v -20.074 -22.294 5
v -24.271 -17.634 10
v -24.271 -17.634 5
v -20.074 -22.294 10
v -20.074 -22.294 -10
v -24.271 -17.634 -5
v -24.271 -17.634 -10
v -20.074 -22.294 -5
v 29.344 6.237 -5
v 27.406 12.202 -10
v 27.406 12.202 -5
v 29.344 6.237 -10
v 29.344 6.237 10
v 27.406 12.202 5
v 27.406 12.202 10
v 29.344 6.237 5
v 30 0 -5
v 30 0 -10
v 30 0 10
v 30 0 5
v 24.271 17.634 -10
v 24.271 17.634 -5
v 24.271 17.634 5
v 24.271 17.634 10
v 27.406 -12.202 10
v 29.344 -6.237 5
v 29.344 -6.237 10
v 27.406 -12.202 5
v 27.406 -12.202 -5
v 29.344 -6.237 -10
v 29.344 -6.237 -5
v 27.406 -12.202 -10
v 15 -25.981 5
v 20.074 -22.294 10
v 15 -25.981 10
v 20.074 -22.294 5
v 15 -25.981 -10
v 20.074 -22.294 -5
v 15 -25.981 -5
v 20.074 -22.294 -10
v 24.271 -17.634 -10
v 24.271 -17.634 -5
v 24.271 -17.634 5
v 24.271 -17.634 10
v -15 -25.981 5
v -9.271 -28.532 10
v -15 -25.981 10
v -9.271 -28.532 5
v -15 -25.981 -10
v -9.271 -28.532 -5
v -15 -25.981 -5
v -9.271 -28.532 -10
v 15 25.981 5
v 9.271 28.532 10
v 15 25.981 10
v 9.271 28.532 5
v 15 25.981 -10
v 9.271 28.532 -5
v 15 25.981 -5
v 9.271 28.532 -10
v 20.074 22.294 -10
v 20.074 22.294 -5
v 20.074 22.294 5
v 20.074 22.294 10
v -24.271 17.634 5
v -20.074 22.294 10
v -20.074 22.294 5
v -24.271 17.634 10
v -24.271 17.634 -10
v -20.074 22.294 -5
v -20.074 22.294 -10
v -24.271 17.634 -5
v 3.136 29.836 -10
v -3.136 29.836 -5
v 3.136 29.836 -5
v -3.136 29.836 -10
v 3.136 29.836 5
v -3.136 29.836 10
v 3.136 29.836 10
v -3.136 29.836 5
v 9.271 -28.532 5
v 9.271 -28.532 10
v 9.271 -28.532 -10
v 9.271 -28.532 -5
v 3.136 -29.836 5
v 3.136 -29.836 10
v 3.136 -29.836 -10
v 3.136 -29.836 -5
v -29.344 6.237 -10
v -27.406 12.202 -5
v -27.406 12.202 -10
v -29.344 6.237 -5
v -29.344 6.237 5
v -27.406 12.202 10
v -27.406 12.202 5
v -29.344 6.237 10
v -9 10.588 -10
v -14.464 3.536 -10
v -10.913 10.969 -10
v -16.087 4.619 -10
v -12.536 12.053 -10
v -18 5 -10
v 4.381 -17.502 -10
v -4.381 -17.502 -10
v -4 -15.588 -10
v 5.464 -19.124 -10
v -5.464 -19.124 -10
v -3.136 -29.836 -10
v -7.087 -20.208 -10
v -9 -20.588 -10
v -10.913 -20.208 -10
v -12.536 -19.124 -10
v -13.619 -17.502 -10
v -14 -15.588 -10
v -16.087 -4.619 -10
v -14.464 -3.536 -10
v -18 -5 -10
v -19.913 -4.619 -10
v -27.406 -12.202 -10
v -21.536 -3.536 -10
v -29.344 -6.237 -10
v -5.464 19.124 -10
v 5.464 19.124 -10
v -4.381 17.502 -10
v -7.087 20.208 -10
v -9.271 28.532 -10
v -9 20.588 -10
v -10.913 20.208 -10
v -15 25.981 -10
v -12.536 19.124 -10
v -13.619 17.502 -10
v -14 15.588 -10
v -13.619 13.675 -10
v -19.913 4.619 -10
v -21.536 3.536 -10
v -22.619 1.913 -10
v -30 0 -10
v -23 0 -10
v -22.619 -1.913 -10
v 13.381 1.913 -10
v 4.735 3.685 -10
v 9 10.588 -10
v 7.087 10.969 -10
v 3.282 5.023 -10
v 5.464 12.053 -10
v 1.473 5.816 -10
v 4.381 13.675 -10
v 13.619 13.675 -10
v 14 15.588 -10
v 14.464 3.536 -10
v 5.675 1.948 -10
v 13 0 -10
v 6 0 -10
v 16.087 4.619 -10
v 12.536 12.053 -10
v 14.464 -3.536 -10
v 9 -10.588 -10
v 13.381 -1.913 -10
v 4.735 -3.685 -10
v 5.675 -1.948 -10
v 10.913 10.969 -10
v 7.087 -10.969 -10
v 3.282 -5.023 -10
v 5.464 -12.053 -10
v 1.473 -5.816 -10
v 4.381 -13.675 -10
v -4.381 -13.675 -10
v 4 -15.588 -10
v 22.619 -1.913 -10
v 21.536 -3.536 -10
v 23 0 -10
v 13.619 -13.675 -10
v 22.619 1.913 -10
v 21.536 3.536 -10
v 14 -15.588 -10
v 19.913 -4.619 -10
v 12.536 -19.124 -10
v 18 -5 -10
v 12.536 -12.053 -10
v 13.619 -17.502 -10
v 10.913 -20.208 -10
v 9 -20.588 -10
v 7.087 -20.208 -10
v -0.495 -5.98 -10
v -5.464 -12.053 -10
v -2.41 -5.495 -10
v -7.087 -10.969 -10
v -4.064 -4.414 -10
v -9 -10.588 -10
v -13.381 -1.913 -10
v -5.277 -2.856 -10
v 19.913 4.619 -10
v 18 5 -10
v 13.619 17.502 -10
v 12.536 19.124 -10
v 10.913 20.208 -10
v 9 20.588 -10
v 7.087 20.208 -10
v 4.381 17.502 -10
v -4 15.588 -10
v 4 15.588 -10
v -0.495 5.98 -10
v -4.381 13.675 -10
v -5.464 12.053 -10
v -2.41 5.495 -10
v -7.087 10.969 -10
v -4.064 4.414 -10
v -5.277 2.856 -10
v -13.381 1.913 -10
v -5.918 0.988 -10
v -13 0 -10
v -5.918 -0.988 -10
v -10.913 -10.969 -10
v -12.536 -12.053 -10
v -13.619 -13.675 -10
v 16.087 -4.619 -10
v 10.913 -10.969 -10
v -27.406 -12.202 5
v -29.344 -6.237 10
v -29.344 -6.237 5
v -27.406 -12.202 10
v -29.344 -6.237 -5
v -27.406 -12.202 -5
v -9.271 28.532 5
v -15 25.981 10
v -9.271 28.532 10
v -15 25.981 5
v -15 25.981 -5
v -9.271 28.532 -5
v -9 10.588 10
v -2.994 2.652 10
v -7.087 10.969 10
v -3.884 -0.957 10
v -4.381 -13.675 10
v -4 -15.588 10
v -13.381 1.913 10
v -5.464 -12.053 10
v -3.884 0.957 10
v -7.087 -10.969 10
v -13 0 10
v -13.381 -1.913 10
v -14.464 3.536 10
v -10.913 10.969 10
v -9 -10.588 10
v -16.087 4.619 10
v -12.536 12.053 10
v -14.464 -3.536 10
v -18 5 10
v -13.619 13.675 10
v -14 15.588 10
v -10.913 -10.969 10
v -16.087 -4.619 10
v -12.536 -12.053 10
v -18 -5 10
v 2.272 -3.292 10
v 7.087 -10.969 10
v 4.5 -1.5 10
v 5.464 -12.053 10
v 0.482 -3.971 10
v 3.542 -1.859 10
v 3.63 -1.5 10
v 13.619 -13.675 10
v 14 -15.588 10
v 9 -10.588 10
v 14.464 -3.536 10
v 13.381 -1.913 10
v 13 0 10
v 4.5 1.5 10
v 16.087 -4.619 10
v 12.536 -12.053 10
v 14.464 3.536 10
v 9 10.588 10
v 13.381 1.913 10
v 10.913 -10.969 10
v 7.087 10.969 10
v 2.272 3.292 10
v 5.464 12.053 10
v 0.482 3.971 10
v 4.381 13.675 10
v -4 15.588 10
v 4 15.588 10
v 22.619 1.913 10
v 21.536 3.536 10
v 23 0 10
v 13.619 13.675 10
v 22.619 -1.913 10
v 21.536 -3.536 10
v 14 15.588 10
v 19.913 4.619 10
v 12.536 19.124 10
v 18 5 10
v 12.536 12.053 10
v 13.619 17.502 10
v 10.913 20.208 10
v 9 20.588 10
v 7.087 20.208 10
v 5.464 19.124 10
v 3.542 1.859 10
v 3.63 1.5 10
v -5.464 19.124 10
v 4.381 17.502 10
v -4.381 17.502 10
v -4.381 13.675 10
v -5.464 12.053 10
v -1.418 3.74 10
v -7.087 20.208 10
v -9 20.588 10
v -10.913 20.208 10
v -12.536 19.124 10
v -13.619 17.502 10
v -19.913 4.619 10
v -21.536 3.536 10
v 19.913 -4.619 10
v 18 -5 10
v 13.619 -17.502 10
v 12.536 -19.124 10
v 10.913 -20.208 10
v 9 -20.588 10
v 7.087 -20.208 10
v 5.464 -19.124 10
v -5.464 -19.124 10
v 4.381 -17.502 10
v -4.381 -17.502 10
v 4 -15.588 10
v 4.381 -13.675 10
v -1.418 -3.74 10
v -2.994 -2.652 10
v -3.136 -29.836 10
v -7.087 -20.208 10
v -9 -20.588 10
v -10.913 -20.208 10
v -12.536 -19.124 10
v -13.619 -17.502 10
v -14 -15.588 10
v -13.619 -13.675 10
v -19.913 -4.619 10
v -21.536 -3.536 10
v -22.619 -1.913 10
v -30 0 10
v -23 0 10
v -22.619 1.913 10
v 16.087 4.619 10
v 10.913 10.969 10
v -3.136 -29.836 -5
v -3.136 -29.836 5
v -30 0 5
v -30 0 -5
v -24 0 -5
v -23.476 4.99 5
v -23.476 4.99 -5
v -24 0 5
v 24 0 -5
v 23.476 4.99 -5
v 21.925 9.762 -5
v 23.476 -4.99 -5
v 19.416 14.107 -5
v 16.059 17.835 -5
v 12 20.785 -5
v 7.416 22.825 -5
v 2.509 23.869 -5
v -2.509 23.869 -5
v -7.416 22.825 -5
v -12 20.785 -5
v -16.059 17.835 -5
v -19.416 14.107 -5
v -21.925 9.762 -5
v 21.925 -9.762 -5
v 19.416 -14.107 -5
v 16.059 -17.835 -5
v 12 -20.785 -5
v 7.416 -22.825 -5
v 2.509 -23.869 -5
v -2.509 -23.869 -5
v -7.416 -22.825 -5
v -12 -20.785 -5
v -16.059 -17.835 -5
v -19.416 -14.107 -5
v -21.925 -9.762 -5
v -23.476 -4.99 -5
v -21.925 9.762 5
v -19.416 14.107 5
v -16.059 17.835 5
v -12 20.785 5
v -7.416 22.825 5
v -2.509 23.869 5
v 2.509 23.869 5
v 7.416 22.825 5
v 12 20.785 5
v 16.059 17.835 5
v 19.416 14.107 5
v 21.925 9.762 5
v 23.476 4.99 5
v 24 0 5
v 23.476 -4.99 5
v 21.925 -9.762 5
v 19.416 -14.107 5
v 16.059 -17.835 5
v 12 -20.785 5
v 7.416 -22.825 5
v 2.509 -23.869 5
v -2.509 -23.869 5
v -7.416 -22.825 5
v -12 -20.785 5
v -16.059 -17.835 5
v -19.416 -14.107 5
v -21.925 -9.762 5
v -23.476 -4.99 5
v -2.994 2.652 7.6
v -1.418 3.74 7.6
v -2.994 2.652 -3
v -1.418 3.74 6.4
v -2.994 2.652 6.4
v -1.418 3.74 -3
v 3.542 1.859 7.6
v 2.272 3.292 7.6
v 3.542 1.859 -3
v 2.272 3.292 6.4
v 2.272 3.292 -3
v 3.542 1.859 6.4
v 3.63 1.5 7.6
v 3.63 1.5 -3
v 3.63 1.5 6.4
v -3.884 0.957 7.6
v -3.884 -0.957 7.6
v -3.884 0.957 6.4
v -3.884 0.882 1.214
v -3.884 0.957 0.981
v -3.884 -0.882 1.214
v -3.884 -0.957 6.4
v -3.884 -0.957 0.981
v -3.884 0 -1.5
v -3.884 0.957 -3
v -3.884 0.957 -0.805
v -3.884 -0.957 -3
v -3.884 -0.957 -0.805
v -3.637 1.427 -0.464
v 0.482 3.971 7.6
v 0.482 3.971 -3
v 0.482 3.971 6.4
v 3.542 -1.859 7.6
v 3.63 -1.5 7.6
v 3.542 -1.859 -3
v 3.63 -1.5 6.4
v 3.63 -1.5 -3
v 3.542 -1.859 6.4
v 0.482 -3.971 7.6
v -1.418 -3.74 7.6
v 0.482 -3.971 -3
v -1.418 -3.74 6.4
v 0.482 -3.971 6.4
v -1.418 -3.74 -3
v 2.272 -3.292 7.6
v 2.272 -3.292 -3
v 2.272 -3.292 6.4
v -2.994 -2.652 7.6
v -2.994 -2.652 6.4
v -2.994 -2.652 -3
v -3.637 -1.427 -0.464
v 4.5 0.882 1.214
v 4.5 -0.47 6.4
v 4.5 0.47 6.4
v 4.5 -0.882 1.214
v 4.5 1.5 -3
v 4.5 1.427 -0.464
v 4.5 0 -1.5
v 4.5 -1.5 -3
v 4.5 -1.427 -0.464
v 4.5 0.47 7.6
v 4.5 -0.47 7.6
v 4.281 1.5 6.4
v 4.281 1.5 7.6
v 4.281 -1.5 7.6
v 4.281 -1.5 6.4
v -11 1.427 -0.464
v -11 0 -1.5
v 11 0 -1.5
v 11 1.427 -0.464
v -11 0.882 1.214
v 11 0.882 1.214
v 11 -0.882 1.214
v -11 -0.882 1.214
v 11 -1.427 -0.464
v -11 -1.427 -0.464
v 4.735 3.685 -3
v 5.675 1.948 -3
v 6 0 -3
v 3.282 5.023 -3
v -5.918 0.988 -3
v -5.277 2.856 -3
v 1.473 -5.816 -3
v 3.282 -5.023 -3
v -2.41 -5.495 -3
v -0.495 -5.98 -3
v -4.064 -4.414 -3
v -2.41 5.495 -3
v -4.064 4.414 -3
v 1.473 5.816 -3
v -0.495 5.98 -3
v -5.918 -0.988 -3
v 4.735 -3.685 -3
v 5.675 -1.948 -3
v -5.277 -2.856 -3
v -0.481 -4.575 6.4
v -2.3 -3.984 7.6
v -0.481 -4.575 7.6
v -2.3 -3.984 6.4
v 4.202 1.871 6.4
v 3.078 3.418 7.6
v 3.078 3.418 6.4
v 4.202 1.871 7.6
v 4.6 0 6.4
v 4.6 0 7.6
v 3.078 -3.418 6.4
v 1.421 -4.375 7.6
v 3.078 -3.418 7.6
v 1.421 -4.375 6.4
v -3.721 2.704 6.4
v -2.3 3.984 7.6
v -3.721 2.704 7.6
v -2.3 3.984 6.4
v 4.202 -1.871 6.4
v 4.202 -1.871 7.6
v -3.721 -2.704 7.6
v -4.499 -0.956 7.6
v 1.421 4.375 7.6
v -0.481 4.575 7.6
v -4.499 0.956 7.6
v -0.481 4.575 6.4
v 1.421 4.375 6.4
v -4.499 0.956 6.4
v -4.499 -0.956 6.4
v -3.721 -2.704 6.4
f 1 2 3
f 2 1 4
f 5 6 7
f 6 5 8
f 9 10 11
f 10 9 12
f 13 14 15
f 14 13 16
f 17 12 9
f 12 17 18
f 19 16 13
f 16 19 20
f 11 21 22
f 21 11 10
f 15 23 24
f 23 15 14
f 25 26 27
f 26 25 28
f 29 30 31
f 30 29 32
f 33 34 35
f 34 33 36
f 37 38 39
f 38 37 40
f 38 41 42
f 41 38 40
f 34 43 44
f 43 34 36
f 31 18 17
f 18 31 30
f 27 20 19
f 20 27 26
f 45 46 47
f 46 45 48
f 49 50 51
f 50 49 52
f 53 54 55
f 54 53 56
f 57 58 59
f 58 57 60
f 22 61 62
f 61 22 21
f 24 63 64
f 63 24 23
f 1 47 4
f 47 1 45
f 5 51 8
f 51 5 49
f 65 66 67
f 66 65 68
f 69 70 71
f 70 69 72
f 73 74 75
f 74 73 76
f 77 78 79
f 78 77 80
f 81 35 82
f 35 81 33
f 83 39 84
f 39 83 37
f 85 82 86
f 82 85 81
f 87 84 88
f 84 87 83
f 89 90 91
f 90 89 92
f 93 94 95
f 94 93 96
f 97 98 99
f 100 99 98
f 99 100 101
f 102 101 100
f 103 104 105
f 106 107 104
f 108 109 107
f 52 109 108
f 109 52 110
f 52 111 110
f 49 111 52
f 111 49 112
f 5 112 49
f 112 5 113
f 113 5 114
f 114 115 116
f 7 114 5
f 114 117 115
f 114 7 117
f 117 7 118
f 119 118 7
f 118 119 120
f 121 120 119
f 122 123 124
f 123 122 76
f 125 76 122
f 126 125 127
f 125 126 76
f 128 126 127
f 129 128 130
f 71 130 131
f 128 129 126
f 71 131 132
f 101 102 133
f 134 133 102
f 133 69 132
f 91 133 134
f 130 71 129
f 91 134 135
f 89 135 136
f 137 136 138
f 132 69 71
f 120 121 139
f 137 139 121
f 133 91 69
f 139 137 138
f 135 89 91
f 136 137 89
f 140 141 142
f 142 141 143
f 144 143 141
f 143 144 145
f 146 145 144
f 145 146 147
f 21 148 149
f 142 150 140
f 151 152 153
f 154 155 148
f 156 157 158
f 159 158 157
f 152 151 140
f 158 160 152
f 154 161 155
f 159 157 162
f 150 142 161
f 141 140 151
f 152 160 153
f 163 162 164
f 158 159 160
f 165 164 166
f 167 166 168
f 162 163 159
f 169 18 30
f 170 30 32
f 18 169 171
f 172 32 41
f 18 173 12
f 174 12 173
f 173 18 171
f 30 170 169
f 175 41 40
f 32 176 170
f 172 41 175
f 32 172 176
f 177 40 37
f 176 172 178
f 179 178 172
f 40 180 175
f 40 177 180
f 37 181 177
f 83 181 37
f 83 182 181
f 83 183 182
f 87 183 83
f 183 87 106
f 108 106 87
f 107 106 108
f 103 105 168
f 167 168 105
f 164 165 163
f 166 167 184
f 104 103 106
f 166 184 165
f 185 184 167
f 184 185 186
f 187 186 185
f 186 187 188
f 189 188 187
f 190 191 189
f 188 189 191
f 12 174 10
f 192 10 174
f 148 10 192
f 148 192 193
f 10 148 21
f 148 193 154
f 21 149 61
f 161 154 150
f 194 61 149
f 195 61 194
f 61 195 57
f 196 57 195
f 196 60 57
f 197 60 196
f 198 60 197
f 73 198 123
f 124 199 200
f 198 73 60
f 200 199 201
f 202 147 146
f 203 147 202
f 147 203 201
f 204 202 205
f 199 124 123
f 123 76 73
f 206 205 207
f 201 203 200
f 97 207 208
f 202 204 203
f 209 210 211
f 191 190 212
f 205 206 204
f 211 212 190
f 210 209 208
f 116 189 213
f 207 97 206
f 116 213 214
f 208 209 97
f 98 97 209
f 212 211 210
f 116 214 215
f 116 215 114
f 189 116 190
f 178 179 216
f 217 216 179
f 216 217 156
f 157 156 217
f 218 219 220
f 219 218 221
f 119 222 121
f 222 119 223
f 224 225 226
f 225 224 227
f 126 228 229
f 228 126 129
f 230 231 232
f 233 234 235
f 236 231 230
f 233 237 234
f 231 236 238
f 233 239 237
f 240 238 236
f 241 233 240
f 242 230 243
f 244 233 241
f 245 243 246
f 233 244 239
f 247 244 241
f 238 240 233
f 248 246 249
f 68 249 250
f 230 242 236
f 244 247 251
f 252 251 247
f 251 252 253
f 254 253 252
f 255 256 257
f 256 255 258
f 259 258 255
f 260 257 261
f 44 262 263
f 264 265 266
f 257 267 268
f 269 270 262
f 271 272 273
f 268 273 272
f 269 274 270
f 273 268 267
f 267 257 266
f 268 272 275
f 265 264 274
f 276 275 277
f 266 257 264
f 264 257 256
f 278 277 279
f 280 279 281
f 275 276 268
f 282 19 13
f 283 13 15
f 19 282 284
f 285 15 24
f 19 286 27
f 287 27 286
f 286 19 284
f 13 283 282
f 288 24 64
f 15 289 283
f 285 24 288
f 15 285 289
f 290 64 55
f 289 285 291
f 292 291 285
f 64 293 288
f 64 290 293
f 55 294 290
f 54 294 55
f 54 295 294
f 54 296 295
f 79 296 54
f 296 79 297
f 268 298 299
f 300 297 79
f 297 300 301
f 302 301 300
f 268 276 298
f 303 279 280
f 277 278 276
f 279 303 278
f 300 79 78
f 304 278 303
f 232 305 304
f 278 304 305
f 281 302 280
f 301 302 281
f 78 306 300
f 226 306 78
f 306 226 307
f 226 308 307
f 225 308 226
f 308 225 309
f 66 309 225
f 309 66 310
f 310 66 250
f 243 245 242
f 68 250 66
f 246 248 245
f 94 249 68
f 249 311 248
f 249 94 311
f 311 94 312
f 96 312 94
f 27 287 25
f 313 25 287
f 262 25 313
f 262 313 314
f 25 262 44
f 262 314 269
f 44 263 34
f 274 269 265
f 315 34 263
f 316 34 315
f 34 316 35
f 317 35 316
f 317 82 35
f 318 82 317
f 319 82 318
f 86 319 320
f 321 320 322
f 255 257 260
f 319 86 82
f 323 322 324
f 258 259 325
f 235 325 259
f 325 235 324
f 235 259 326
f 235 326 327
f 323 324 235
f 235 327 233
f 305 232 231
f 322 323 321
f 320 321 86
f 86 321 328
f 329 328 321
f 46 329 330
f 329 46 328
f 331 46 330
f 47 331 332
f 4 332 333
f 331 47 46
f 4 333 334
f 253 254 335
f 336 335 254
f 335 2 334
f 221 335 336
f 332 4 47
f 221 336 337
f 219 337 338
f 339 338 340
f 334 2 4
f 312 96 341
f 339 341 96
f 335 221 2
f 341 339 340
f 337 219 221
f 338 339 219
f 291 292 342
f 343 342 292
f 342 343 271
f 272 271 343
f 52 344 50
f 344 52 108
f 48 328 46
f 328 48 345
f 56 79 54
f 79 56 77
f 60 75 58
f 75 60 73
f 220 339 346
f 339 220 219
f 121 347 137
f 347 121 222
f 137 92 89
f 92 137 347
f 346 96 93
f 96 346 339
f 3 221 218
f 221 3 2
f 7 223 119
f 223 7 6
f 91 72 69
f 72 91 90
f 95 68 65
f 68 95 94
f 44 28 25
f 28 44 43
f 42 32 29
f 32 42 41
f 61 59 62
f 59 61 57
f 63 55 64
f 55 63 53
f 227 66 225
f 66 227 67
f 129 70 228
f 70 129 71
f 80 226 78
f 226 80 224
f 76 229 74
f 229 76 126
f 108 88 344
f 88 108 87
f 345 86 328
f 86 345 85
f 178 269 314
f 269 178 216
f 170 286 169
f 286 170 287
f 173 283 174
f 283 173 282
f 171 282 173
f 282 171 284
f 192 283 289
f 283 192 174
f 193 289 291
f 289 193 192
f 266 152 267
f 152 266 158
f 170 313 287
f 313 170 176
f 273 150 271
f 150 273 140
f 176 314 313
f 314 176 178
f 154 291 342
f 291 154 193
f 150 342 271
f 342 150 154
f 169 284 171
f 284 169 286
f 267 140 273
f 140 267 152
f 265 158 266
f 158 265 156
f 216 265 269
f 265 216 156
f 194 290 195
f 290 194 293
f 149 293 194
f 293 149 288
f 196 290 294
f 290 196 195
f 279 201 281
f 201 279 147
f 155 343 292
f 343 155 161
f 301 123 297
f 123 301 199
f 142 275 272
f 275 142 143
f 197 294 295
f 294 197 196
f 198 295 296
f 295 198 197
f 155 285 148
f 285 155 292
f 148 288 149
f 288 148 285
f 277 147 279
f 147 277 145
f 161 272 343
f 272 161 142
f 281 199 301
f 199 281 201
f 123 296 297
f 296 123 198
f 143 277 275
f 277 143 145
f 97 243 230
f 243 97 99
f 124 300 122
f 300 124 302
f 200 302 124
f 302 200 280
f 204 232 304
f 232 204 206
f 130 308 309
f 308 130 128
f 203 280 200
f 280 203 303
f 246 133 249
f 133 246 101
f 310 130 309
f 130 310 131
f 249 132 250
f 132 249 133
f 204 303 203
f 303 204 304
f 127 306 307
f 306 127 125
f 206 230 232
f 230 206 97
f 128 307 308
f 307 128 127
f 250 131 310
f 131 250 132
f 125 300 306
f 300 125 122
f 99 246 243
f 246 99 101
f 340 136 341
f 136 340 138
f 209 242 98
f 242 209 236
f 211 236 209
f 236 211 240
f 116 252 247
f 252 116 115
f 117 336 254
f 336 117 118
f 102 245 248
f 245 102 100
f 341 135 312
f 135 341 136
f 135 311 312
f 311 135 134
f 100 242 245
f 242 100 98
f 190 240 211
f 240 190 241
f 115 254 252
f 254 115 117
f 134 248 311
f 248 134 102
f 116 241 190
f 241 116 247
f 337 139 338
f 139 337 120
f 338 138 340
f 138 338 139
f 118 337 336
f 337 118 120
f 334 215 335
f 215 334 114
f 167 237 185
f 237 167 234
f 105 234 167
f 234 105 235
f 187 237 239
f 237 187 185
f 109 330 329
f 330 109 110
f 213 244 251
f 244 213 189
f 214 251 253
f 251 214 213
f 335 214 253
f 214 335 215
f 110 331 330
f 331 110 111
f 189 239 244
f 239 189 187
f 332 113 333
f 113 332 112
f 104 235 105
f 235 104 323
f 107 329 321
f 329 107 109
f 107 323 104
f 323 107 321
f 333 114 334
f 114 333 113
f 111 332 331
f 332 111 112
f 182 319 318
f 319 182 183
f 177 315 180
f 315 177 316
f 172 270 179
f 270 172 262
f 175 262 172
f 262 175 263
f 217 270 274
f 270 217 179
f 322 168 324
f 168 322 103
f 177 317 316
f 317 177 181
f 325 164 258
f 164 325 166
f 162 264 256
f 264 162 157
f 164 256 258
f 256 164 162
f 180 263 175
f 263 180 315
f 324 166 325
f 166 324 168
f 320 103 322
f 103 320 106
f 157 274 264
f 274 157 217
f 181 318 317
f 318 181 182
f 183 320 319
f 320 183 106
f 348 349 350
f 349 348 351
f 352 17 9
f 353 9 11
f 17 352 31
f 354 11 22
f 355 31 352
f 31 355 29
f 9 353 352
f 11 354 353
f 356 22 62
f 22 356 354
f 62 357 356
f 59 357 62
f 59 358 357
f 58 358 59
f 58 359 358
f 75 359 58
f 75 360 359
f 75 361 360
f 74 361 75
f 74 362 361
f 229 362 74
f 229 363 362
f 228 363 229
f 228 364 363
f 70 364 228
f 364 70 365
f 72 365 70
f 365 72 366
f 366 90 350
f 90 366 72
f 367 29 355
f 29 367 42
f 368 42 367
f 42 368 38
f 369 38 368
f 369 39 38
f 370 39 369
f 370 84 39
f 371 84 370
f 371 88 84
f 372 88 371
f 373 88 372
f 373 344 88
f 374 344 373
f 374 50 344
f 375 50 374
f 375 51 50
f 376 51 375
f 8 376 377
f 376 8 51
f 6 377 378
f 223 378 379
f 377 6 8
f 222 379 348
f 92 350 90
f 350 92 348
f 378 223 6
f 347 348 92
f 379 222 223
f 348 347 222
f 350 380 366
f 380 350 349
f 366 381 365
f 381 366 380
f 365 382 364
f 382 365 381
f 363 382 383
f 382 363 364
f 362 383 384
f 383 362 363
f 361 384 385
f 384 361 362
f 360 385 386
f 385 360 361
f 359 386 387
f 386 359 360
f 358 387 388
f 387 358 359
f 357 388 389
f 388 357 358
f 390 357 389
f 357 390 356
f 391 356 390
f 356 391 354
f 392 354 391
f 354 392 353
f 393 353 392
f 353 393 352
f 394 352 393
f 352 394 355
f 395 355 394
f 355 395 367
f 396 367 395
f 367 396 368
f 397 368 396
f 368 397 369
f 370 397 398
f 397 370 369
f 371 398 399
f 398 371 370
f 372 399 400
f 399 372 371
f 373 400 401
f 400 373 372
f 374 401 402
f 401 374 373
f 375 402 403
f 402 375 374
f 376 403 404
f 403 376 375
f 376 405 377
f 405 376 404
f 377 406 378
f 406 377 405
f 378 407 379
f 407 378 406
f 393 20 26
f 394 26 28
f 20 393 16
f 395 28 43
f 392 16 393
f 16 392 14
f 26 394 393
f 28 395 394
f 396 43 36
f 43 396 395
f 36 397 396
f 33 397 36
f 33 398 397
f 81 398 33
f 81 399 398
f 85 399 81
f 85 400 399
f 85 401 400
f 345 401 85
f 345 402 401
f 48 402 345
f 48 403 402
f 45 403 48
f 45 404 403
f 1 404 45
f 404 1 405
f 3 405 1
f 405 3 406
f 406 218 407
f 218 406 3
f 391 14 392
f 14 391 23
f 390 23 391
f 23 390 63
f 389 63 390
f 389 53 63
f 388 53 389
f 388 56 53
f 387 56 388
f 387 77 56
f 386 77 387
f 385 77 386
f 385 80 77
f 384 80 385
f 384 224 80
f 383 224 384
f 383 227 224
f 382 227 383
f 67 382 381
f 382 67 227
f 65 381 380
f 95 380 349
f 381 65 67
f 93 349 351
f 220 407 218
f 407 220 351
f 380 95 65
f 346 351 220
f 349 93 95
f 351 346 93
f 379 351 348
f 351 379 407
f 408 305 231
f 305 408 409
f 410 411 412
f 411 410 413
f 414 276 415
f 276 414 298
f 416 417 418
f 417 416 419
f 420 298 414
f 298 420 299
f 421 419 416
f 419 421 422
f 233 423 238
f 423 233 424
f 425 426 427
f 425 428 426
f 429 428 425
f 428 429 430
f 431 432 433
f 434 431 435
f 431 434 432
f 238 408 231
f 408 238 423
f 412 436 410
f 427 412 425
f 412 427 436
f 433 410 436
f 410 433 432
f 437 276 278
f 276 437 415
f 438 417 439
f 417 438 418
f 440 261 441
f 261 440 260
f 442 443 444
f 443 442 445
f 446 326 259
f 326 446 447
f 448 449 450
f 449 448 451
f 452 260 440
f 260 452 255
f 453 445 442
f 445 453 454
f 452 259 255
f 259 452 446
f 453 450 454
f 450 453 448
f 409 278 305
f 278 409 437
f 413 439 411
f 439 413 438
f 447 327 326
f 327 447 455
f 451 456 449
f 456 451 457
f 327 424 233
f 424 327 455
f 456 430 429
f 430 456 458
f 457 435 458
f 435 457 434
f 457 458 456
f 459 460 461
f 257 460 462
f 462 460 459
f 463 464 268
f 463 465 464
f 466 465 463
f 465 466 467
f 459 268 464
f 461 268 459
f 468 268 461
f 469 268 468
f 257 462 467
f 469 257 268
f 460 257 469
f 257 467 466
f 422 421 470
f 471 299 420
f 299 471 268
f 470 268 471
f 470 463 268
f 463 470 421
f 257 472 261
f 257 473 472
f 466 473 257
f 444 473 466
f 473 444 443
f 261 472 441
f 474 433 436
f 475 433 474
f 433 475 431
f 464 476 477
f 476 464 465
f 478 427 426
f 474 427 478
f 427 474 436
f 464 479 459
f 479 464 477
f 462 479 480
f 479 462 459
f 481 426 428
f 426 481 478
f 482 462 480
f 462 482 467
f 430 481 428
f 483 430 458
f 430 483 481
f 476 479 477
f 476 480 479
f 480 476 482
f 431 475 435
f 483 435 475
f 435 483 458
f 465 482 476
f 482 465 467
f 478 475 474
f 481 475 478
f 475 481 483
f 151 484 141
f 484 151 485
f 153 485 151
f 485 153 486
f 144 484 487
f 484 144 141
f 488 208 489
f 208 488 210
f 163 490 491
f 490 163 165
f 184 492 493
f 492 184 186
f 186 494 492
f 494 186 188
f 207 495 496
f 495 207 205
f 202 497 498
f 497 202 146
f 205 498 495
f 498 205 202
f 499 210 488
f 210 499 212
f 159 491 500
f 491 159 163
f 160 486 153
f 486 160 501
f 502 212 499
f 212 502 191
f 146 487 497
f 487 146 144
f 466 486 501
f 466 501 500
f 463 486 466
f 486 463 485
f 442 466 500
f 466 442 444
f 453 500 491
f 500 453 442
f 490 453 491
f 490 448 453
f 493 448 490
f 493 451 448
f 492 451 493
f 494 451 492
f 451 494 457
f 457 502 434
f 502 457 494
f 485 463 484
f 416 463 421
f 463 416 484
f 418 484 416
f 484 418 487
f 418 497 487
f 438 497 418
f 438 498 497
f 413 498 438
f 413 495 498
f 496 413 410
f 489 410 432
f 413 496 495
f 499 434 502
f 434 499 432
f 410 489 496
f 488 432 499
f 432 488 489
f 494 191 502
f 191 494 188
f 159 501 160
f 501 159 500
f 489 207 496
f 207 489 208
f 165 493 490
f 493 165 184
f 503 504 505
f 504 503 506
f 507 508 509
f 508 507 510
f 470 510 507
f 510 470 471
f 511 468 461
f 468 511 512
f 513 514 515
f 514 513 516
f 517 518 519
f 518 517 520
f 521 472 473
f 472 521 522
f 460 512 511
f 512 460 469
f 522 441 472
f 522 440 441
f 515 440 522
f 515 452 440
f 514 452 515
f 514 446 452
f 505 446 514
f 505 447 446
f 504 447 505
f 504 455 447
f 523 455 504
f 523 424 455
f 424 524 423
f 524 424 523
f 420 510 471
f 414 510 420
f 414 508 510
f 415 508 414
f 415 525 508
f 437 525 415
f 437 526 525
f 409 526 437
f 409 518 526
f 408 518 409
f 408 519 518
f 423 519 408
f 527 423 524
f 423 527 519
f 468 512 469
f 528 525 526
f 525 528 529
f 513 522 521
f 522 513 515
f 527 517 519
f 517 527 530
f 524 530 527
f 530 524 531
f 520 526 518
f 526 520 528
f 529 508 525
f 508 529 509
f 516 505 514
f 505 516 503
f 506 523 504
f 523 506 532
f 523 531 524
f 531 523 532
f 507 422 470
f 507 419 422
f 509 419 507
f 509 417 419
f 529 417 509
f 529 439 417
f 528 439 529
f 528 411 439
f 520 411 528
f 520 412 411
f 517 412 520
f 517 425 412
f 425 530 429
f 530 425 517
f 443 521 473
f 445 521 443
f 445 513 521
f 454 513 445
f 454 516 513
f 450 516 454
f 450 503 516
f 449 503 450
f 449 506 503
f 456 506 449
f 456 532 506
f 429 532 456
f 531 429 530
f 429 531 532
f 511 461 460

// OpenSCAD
// Parameters
pulley_od = 60; //[30:120:1]
pulley_width = 20; //[10:40:1]
bore_d = 8; //[4:16:0.5]
groove_depth = 6; //[3:12:0.5]
groove_top_w = 10; //[5:20:0.5]
groove_angle_deg = 60; //[30:120:1]
flange_thk = 2; //[1:5:0.5]
hub_od = 20; //[10:40:1]
hub_width = 20; //[10:40:1]
rim_thk = 4; //[2:10:0.5]
web_thk = 4; //[2:10:0.5]
set_screw_d = 3; //[2:6:0.5]
set_screw_z = 0; //[-8:8:0.5]
keyway_w = 3; //[2:6:0.5]
keyway_h = 1.5; //[0.8:3:0.1]
light_hole_d = 10; //[6:20:1]
light_hole_count = 6; //[3:12:1]
bearing_seat_d = 12; //[8:24:0.5]
bearing_seat_depth = 6; //[2:12:0.5]
ret_ring_groove_w = 1.2; //[0.8:2.5:0.1]
ret_ring_groove_depth = 0.6; //[0.3:1.5:0.1]
ret_ring_groove_z = 7; //[2:15:0.5]
chamfer = 0.8; //[0.2:2:0.1]
overlap = 1; //[0.5:2:0.1]

// Base Shapes
module sheave_wheel() {
  cylinder(r= pulley_od/2, h= pulley_width, center=true);
}

module hub() {
  cylinder(r= hub_od/2, h= hub_width, center=true);
}

module side_flange_left() {
  translate([0, 0, -pulley_width/2 + flange_thk/2])
    cylinder(r= pulley_od/2, h= flange_thk, center=true);
}

module side_flange_right() {
  translate([0, 0, pulley_width/2 - flange_thk/2])
    cylinder(r= pulley_od/2, h= flange_thk, center=true);
}

module central_bore() {
  cylinder(r= bore_d/2, h= pulley_width + 2*overlap, center=true);
}

module groove_profile() {
  rotate_extrude() {
    polygon(points=[
      [pulley_od/2 - groove_depth, -groove_top_w/2],
      [pulley_od/2, -groove_top_w/2],
      [pulley_od/2, groove_top_w/2],
      [pulley_od/2 - groove_depth, groove_top_w/2],
      [pulley_od/2 - groove_depth, groove_top_w/2 - groove_depth*tan(groove_angle_deg/2)],
      [pulley_od/2 - groove_depth, -groove_top_w/2 + groove_depth*tan(groove_angle_deg/2)]
    ]);
  }
}

module set_screw_hole() {
  rotate([0, 90, 0])
    translate([0, 0, set_screw_z])
      cylinder(r= set_screw_d/2, h= hub_od + 2*overlap, center=true);
}

module keyway() {
  translate([bore_d/2 - keyway_h/2, 0, 0])
    cube([keyway_h + overlap, keyway_w, hub_width + 2*overlap], center=true);
}

module lightening_hole(angle) {
  translate([(hub_od/2 + (pulley_od/2 - rim_thk))/2 * cos(angle), 
             (hub_od/2 + (pulley_od/2 - rim_thk))/2 * sin(angle), 0])
    cylinder(r= light_hole_d/2, h= pulley_width + 2*overlap, center=true);
}

module bearing_seat() {
  translate([0, 0, -pulley_width/2 + (bearing_seat_depth + overlap)/2])
    cylinder(r= bearing_seat_d/2, h= bearing_seat_depth + overlap, center=true);
}

module retaining_ring_groove() {
  translate([0, 0, ret_ring_groove_z])
    cylinder(r= bore_d/2 + ret_ring_groove_depth, h= ret_ring_groove_w, center=true);
}

module chamfer_cone_front() {
  rotate([180, 0, 0])
    translate([0, 0, pulley_width/2 - (chamfer + overlap)/2])
      cylinder(r1= bore_d/2 + chamfer, r2= 0, h= chamfer + overlap, center=true);
}

module chamfer_cone_back() {
  translate([0, 0, -pulley_width/2 + (chamfer + overlap)/2])
    cylinder(r1= bore_d/2 + chamfer, r2= 0, h= chamfer + overlap, center=true);
}

// Final Assembly
difference() {
  union() {
    sheave_wheel();
    hub();
    side_flange_left();
    side_flange_right();
  }
  groove_profile();
  central_bore();
  keyway();
  set_screw_hole();
  for (i = [0:light_hole_count-1]) {
    lightening_hole(360/light_hole_count * i);
  }
  bearing_seat();
  retaining_ring_groove();
  chamfer_cone_front();
  chamfer_cone_back();
}
